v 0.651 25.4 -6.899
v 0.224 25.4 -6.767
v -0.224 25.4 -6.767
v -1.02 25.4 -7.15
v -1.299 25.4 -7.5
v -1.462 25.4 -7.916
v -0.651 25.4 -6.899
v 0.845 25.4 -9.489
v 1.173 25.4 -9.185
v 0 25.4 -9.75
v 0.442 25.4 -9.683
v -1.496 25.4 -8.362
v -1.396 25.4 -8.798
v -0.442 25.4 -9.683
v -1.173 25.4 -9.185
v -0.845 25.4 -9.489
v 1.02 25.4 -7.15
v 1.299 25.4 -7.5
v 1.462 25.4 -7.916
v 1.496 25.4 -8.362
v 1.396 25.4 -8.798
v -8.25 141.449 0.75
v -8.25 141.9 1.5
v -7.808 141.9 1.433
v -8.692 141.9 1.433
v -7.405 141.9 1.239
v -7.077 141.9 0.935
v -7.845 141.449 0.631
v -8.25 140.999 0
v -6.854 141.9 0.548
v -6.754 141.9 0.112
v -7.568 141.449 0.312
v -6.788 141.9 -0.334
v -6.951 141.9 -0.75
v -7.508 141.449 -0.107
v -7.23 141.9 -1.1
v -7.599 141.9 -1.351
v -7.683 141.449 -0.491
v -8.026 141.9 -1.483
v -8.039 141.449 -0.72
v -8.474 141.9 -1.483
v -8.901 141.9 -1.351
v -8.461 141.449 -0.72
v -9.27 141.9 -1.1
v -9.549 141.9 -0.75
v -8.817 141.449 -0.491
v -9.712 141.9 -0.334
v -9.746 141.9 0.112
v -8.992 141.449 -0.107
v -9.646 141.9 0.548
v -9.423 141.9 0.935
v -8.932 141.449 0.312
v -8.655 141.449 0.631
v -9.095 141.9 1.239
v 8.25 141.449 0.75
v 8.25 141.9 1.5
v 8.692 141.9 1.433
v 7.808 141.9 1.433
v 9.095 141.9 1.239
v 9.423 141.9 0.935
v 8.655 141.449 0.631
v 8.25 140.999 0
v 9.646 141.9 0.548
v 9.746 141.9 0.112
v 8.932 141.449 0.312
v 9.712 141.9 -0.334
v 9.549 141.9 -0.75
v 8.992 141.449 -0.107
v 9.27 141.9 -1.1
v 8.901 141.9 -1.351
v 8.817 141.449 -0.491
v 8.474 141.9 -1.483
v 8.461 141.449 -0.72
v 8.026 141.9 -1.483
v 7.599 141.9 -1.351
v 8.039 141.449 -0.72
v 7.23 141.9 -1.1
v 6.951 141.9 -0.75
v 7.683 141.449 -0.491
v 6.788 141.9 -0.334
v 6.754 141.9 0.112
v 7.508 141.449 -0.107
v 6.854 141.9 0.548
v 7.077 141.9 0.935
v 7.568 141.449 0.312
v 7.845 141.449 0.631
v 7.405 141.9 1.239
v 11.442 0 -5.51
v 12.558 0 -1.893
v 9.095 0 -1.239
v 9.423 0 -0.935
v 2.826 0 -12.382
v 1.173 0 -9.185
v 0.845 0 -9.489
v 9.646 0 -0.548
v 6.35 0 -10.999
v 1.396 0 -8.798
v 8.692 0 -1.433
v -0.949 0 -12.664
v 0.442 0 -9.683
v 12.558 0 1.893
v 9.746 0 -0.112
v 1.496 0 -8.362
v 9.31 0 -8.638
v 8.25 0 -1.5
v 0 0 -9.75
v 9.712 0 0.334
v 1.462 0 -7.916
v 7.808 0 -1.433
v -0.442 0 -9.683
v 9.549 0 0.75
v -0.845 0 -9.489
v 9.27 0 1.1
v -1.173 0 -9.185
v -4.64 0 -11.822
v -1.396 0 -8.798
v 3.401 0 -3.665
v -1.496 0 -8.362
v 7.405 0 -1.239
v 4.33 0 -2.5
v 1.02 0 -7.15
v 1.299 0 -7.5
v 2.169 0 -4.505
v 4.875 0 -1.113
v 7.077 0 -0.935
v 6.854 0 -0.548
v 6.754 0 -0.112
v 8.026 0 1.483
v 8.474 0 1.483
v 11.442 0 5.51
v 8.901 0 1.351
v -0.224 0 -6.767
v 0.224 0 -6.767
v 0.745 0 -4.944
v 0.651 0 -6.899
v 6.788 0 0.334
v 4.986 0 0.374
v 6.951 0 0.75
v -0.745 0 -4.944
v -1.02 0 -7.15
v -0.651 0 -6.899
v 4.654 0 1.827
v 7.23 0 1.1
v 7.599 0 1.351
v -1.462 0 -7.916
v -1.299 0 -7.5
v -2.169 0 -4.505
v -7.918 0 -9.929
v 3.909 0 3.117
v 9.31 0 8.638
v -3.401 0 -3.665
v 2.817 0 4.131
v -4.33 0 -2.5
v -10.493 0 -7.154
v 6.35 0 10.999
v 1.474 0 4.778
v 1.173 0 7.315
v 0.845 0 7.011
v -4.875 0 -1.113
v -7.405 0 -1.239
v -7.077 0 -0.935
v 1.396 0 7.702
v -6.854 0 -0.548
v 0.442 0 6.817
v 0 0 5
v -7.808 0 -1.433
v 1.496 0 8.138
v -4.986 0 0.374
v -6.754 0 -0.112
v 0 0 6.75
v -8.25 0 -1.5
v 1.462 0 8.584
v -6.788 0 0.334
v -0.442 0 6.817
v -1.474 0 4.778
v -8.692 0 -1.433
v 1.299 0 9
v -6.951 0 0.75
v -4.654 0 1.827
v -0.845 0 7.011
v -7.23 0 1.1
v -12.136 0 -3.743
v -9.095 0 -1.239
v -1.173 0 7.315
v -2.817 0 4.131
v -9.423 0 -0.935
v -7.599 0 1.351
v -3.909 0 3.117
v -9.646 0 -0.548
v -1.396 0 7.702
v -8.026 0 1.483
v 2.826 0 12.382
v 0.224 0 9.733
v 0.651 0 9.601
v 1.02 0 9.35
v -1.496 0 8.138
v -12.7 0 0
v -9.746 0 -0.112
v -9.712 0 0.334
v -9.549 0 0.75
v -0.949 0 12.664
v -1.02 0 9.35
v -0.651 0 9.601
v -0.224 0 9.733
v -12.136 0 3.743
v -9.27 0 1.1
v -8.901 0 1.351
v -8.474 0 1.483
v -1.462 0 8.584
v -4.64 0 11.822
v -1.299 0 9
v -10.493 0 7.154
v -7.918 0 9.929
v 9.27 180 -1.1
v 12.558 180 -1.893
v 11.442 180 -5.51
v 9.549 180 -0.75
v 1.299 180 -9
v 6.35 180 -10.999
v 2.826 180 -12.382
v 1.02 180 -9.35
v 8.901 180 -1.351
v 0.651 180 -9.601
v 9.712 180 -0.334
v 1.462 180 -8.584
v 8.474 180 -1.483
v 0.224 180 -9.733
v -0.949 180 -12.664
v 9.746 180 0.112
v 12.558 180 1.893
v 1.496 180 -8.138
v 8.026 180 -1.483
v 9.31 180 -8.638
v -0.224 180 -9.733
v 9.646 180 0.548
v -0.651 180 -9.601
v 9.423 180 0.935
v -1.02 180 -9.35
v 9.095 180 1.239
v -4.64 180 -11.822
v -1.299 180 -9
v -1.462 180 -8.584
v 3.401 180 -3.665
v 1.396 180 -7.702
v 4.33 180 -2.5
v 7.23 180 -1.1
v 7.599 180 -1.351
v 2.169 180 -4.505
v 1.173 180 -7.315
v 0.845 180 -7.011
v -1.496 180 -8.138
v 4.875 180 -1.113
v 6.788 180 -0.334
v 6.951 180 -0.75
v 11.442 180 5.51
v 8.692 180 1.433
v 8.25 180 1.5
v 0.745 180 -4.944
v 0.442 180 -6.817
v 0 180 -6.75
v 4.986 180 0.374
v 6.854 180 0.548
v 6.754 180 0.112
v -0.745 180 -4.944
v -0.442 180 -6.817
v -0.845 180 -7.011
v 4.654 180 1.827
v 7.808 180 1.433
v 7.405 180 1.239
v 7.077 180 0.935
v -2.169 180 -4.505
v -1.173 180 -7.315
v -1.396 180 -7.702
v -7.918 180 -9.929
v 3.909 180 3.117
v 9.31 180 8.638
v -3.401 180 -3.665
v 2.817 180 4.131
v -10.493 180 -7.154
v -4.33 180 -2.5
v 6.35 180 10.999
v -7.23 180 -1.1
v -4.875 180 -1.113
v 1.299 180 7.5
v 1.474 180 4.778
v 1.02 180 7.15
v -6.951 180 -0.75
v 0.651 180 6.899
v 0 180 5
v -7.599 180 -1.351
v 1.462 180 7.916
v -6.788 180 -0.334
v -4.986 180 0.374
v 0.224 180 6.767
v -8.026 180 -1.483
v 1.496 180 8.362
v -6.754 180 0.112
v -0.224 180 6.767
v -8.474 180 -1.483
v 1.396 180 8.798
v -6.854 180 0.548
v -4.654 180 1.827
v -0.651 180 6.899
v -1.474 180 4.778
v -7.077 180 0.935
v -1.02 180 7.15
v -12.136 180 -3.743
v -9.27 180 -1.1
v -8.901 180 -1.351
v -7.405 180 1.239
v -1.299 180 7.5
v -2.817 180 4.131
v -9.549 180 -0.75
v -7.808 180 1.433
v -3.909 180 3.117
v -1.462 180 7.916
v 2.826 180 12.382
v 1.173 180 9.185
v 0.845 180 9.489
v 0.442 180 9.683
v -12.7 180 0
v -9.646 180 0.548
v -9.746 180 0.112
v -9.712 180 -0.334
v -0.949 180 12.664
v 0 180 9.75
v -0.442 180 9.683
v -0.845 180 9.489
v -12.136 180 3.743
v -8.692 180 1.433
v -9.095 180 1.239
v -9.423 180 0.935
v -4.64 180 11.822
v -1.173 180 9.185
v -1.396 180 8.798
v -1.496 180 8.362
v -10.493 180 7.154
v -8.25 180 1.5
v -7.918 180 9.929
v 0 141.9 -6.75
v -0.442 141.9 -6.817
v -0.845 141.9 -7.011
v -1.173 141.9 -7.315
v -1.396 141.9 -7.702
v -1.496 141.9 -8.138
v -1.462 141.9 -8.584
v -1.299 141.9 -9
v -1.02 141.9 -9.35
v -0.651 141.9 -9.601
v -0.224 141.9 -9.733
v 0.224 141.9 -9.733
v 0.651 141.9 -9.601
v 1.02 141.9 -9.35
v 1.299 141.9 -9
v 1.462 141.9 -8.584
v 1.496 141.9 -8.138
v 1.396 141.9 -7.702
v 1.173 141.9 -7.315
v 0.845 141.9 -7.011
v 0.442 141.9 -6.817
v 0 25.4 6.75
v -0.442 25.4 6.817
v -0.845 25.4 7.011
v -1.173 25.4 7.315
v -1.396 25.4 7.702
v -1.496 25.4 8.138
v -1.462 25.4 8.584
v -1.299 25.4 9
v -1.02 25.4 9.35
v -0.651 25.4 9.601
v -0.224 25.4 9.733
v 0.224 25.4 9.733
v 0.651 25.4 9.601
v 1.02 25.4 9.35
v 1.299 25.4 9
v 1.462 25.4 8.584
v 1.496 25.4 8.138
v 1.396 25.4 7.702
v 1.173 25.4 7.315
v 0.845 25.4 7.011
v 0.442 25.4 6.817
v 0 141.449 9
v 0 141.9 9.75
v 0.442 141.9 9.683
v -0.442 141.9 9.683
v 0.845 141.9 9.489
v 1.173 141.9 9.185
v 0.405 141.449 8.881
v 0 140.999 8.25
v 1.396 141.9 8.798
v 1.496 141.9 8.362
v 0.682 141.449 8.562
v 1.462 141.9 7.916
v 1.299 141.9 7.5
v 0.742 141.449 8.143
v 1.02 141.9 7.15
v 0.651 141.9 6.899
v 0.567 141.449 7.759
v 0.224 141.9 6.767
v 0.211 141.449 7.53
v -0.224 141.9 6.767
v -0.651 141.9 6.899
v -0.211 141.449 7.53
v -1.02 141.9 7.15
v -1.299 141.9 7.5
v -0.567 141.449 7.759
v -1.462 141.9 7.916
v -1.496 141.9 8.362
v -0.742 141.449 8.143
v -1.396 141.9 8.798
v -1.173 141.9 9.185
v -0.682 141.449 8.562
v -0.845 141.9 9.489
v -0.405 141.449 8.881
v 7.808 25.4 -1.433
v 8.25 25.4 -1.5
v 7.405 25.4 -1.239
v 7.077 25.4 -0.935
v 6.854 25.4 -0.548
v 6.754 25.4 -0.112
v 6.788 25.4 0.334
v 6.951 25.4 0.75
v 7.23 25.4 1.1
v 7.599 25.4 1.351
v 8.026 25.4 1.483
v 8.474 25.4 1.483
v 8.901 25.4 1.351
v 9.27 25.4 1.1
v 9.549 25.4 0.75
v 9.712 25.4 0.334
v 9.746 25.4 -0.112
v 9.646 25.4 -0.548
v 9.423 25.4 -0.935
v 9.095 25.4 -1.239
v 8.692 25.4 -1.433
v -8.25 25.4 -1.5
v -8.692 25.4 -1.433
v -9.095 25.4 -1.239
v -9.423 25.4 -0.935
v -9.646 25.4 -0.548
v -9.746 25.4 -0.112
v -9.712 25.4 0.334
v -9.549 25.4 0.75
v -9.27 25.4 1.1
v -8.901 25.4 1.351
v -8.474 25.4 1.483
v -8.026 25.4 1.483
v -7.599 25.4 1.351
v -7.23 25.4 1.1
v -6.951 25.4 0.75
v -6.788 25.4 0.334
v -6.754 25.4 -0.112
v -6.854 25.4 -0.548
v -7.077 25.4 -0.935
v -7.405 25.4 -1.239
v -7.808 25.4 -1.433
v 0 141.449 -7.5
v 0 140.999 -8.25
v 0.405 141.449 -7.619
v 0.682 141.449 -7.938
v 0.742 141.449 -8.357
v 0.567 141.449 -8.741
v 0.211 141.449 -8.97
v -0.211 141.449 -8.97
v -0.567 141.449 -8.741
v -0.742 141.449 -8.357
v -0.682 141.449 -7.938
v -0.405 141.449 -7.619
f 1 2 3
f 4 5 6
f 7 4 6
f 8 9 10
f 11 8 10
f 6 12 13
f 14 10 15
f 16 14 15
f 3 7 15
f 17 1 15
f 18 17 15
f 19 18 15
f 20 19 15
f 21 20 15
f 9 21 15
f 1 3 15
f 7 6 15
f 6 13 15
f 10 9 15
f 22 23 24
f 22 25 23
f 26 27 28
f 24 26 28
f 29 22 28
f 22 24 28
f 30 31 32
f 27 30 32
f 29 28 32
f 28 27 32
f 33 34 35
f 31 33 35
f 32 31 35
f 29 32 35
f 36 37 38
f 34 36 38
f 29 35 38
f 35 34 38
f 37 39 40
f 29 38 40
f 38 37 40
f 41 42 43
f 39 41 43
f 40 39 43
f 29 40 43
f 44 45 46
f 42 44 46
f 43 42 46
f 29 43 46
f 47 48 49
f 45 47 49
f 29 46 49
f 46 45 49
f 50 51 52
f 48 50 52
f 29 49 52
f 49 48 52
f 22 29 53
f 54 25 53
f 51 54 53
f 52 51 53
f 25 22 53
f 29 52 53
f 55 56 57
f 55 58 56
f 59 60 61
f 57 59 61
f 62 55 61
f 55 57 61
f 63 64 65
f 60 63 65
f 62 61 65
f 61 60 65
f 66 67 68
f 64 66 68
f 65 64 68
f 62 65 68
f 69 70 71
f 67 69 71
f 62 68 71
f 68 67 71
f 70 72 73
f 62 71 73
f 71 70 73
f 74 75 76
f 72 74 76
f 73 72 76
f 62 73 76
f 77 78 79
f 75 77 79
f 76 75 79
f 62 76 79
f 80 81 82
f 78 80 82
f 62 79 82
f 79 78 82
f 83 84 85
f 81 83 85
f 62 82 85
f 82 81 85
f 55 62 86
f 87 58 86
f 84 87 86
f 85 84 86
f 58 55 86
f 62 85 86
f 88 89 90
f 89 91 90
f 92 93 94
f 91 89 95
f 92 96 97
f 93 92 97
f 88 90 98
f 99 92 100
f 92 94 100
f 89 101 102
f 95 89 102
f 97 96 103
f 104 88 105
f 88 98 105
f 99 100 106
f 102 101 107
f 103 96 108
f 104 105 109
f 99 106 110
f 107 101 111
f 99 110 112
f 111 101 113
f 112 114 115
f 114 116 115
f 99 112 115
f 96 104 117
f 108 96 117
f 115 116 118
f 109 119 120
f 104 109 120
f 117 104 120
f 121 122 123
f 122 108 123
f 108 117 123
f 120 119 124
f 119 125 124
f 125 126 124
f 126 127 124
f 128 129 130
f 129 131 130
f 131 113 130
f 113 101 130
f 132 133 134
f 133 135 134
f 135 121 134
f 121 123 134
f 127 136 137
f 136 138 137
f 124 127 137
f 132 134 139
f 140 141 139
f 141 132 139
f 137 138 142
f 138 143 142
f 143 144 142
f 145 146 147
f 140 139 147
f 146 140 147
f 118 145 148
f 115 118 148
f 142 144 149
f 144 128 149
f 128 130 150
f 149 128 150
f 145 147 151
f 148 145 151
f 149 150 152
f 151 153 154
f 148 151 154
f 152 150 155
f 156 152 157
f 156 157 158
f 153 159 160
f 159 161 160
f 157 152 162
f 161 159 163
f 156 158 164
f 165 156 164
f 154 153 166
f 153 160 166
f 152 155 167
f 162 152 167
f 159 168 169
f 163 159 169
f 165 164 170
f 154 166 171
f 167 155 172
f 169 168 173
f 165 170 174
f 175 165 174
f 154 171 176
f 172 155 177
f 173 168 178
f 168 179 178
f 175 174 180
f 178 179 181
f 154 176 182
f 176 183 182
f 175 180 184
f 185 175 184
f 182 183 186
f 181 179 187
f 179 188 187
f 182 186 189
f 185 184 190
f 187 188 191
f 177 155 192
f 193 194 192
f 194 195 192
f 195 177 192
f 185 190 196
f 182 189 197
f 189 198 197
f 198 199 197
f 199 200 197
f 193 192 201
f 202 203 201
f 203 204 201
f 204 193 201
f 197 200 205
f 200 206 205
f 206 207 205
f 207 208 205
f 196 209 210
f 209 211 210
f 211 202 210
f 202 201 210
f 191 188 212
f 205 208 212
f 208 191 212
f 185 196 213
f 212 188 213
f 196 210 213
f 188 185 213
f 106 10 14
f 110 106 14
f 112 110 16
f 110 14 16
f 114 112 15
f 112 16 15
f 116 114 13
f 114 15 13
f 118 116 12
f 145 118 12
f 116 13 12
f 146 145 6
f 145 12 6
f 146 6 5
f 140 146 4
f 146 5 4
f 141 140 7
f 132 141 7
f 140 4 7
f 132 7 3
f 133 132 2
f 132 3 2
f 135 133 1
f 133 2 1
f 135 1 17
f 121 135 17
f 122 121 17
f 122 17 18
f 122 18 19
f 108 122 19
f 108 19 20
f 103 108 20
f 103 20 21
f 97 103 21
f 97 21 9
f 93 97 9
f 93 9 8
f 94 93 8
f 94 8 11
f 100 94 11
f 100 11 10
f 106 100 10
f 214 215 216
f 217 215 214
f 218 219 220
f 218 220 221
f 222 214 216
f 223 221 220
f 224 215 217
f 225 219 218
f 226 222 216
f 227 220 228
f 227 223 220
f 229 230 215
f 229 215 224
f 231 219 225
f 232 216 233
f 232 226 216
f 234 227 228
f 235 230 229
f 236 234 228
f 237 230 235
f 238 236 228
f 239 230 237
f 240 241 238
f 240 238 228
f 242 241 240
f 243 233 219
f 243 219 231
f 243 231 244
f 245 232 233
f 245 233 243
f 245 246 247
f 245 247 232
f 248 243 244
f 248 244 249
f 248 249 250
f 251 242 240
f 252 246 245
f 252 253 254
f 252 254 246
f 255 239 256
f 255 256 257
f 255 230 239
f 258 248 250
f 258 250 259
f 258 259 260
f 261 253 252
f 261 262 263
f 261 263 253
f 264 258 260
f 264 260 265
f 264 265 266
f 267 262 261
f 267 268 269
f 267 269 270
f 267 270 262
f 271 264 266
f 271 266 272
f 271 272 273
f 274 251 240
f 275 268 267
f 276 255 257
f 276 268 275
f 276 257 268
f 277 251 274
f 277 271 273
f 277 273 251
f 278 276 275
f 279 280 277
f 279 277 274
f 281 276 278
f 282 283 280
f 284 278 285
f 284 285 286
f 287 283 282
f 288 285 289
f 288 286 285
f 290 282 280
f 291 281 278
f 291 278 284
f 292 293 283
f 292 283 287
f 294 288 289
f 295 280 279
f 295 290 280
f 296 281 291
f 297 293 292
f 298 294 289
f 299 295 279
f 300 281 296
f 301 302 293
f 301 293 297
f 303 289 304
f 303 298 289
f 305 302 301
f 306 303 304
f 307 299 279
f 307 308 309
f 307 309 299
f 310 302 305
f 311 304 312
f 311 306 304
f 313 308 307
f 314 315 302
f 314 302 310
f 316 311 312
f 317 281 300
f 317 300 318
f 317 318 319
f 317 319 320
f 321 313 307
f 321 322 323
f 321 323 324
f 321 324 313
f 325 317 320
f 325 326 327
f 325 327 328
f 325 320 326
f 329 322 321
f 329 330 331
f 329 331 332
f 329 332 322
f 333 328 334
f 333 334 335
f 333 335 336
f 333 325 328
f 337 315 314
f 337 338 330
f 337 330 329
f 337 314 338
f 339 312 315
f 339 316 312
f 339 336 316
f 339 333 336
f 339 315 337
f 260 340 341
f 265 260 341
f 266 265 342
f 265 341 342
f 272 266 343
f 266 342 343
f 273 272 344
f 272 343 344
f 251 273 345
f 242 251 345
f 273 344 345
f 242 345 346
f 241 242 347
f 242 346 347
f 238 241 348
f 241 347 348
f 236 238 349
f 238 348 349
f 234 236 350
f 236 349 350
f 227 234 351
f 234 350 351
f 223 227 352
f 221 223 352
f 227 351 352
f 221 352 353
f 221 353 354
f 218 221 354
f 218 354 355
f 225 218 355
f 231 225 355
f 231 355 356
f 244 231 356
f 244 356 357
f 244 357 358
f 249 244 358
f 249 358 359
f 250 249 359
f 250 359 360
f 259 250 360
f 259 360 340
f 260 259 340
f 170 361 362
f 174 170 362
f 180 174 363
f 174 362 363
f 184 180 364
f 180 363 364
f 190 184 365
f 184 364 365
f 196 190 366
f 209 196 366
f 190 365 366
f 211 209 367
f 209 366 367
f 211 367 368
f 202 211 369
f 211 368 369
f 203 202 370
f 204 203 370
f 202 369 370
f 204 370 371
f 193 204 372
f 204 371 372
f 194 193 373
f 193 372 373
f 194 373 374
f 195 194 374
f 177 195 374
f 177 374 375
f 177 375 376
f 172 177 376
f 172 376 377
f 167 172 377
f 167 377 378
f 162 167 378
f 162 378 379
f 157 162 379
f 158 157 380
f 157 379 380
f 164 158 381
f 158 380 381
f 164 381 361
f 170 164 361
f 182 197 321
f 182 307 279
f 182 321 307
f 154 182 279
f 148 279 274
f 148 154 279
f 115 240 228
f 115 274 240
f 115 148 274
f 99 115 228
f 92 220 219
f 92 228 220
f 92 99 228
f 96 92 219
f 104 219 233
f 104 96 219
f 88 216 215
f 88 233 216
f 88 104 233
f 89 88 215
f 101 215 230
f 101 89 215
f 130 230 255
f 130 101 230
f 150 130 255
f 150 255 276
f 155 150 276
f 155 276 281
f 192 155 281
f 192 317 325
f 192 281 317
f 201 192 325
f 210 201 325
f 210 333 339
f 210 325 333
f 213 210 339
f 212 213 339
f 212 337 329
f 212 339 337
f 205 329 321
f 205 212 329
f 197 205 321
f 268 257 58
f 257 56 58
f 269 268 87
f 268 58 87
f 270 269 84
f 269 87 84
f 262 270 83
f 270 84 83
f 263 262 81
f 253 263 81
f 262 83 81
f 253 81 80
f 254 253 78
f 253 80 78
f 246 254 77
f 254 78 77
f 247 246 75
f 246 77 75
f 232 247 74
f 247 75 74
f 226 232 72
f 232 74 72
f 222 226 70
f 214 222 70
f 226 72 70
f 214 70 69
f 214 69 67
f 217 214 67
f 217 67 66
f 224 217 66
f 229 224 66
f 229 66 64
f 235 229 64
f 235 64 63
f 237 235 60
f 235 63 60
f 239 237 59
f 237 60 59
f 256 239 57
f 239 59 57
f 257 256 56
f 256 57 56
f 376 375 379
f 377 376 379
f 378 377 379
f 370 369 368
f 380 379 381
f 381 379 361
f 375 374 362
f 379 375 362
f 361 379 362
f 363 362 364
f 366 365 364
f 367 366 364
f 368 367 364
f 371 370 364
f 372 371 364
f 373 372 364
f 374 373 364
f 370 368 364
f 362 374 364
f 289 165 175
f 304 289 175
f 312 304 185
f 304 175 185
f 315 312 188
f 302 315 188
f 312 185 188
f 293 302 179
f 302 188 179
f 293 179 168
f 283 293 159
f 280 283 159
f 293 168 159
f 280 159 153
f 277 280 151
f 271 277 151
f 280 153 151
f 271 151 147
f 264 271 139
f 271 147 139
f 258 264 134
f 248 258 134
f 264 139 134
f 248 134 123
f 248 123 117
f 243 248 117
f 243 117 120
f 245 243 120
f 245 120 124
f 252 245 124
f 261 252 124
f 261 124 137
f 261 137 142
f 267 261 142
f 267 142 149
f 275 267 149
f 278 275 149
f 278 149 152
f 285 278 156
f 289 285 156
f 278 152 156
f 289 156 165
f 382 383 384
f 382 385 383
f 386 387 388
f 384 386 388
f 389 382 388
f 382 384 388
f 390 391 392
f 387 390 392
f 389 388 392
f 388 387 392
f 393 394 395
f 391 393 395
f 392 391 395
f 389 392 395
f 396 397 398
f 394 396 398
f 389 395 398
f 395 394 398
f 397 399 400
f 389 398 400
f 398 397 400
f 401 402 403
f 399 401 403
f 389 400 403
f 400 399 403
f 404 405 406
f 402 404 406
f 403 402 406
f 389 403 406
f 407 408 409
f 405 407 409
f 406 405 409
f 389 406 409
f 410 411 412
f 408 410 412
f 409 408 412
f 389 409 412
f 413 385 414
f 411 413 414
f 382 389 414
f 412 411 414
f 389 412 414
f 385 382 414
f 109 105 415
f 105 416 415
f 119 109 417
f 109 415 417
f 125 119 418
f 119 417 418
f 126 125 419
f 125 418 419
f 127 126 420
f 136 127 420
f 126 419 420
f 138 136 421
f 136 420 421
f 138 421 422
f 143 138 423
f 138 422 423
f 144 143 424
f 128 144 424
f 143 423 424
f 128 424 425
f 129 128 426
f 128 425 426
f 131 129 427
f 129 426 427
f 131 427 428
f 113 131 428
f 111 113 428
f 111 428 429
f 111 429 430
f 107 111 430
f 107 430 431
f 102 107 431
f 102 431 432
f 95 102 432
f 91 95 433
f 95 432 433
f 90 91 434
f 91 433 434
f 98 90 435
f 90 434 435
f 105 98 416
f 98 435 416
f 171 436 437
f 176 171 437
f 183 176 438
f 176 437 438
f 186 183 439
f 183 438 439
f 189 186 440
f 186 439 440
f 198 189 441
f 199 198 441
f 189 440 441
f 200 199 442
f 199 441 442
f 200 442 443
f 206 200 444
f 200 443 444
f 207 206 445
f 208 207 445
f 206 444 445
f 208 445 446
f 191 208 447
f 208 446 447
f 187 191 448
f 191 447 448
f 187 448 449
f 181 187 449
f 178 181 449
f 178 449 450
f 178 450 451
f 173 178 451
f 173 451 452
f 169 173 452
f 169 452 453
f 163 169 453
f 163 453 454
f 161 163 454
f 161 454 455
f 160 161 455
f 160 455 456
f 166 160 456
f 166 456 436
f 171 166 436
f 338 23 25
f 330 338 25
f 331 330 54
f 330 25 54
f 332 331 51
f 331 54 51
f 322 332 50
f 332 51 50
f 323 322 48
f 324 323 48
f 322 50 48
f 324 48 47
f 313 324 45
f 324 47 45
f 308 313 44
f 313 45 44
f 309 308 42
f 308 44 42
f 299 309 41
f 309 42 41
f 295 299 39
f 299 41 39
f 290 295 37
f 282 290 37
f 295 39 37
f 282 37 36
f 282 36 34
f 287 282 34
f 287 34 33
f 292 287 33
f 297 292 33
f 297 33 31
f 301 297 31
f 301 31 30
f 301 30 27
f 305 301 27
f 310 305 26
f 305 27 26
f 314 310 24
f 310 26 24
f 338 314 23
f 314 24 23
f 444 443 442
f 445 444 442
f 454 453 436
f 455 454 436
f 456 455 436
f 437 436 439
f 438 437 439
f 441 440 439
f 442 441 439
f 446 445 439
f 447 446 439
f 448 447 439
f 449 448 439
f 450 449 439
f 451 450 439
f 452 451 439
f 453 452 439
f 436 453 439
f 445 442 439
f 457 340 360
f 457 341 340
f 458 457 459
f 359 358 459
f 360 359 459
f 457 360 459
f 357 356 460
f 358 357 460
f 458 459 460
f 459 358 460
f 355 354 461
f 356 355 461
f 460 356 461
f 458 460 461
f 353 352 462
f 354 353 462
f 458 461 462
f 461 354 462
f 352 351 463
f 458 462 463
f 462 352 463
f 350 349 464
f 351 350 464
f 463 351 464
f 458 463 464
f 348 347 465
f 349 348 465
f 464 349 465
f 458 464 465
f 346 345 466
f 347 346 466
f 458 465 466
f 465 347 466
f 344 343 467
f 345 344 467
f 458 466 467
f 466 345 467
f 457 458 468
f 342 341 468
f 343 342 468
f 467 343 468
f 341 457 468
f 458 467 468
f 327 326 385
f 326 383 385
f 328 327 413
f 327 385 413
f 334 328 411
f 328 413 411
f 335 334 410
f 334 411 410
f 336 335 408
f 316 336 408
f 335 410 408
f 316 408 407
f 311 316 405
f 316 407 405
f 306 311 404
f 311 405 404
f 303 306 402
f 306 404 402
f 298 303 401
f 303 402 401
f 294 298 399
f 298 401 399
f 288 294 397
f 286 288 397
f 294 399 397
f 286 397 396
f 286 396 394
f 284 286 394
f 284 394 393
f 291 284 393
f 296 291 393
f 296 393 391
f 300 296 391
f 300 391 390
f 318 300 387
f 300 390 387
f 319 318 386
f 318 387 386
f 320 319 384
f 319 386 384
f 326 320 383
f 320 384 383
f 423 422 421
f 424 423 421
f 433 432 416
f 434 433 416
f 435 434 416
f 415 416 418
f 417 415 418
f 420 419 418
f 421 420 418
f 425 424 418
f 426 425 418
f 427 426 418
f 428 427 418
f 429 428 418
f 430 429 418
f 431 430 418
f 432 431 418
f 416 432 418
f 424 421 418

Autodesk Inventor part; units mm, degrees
ref_plane "YZ Plane" through (0, 0, 0) normal (1, 0, 0) x (0, 1, 0)
ref_plane "XZ Plane" through (0, 0, 0) normal (0, 1, 0) x (-1, 0, 0)
ref_plane "XY Plane" through (0, 0, 0) normal (0, 0, 1) x (1, 0, 0)
sketch "Sketch1" plane through (0, 0, 0) normal (0, 1, 0) x (-1, 0, 0)
  circle A0 centre (0, 0) radius 12.7
  dimension "d0" = 25.4
extrude "Extrusion1" add sketch "Sketch1" along normal blind 180
sketch "Sketch3" plane through (0, 180, 0) normal (0, 1, 0) x (1, 0, 0)
  point P0 (0, 0)
  point P1 (0, 0)
hole "Hole2" at (0, 180, 0) direction (0, -1, 0) diameter 10 end through all
sketch "Sketch4" plane through (0, 180, 0) normal (0, 1, 0) x (1, 0, 0)
  point P0 (0, 0)
  point P1 (0, -8.25)
  point P2 (-8.25, 0)
  point P3 (0, 8.25)
  point P4 (8.25, 0)
  dimension "d17" = 8.25
  dimension "d20" = 360
hole "Hole3" at (0, 180, 8.25) at (-8.25, 180, 0) at (0, 180, -8.25) at (8.25, 180, 0) direction (0, -1, 0) diameter 3 depth 38.1 tip angle 118
thread "Thread1" size "M3x0.5" class "6H" standard "ANSI Metric M Profile" full length
thread "Thread2" size "M3x0.5" class "6H" standard "ANSI Metric M Profile" full length
thread "Thread3" size "M3x0.5" class "6H" standard "ANSI Metric M Profile" full length
thread "Thread4" size "M3x0.5" class "6H" standard "ANSI Metric M Profile" full length
sketch "Sketch5" plane through (0, 0, 0) normal (0, -1, 0) x (1, 0, 0)
  circle A0 centre (8.25, 0) radius 1.5 projected
  circle A1 centre (0, 8.25) radius 1.5 projected
  circle A2 centre (-8.25, 0) radius 1.5 projected
  circle A3 centre (0, -8.25) radius 1.5 projected
  point P0 (0, 0)
hole "Hole4" at (8.25, 0, 0) at (0, 0, 8.25) at (-8.25, 0, 0) at (0, 0, -8.25) direction (0, 1, 0) diameter 3 depth 25.4
thread "Thread5" size "M3x0.5" class "6H" standard "ANSI Metric M Profile" full length
thread "Thread6" size "M3x0.5" class "6H" standard "ANSI Metric M Profile" full length
thread "Thread7" size "M3x0.5" class "6H" standard "ANSI Metric M Profile" full length
thread "Thread8" size "M3x0.5" class "6H" standard "ANSI Metric M Profile" full length
properties part number "BarraSolidaMotor"
